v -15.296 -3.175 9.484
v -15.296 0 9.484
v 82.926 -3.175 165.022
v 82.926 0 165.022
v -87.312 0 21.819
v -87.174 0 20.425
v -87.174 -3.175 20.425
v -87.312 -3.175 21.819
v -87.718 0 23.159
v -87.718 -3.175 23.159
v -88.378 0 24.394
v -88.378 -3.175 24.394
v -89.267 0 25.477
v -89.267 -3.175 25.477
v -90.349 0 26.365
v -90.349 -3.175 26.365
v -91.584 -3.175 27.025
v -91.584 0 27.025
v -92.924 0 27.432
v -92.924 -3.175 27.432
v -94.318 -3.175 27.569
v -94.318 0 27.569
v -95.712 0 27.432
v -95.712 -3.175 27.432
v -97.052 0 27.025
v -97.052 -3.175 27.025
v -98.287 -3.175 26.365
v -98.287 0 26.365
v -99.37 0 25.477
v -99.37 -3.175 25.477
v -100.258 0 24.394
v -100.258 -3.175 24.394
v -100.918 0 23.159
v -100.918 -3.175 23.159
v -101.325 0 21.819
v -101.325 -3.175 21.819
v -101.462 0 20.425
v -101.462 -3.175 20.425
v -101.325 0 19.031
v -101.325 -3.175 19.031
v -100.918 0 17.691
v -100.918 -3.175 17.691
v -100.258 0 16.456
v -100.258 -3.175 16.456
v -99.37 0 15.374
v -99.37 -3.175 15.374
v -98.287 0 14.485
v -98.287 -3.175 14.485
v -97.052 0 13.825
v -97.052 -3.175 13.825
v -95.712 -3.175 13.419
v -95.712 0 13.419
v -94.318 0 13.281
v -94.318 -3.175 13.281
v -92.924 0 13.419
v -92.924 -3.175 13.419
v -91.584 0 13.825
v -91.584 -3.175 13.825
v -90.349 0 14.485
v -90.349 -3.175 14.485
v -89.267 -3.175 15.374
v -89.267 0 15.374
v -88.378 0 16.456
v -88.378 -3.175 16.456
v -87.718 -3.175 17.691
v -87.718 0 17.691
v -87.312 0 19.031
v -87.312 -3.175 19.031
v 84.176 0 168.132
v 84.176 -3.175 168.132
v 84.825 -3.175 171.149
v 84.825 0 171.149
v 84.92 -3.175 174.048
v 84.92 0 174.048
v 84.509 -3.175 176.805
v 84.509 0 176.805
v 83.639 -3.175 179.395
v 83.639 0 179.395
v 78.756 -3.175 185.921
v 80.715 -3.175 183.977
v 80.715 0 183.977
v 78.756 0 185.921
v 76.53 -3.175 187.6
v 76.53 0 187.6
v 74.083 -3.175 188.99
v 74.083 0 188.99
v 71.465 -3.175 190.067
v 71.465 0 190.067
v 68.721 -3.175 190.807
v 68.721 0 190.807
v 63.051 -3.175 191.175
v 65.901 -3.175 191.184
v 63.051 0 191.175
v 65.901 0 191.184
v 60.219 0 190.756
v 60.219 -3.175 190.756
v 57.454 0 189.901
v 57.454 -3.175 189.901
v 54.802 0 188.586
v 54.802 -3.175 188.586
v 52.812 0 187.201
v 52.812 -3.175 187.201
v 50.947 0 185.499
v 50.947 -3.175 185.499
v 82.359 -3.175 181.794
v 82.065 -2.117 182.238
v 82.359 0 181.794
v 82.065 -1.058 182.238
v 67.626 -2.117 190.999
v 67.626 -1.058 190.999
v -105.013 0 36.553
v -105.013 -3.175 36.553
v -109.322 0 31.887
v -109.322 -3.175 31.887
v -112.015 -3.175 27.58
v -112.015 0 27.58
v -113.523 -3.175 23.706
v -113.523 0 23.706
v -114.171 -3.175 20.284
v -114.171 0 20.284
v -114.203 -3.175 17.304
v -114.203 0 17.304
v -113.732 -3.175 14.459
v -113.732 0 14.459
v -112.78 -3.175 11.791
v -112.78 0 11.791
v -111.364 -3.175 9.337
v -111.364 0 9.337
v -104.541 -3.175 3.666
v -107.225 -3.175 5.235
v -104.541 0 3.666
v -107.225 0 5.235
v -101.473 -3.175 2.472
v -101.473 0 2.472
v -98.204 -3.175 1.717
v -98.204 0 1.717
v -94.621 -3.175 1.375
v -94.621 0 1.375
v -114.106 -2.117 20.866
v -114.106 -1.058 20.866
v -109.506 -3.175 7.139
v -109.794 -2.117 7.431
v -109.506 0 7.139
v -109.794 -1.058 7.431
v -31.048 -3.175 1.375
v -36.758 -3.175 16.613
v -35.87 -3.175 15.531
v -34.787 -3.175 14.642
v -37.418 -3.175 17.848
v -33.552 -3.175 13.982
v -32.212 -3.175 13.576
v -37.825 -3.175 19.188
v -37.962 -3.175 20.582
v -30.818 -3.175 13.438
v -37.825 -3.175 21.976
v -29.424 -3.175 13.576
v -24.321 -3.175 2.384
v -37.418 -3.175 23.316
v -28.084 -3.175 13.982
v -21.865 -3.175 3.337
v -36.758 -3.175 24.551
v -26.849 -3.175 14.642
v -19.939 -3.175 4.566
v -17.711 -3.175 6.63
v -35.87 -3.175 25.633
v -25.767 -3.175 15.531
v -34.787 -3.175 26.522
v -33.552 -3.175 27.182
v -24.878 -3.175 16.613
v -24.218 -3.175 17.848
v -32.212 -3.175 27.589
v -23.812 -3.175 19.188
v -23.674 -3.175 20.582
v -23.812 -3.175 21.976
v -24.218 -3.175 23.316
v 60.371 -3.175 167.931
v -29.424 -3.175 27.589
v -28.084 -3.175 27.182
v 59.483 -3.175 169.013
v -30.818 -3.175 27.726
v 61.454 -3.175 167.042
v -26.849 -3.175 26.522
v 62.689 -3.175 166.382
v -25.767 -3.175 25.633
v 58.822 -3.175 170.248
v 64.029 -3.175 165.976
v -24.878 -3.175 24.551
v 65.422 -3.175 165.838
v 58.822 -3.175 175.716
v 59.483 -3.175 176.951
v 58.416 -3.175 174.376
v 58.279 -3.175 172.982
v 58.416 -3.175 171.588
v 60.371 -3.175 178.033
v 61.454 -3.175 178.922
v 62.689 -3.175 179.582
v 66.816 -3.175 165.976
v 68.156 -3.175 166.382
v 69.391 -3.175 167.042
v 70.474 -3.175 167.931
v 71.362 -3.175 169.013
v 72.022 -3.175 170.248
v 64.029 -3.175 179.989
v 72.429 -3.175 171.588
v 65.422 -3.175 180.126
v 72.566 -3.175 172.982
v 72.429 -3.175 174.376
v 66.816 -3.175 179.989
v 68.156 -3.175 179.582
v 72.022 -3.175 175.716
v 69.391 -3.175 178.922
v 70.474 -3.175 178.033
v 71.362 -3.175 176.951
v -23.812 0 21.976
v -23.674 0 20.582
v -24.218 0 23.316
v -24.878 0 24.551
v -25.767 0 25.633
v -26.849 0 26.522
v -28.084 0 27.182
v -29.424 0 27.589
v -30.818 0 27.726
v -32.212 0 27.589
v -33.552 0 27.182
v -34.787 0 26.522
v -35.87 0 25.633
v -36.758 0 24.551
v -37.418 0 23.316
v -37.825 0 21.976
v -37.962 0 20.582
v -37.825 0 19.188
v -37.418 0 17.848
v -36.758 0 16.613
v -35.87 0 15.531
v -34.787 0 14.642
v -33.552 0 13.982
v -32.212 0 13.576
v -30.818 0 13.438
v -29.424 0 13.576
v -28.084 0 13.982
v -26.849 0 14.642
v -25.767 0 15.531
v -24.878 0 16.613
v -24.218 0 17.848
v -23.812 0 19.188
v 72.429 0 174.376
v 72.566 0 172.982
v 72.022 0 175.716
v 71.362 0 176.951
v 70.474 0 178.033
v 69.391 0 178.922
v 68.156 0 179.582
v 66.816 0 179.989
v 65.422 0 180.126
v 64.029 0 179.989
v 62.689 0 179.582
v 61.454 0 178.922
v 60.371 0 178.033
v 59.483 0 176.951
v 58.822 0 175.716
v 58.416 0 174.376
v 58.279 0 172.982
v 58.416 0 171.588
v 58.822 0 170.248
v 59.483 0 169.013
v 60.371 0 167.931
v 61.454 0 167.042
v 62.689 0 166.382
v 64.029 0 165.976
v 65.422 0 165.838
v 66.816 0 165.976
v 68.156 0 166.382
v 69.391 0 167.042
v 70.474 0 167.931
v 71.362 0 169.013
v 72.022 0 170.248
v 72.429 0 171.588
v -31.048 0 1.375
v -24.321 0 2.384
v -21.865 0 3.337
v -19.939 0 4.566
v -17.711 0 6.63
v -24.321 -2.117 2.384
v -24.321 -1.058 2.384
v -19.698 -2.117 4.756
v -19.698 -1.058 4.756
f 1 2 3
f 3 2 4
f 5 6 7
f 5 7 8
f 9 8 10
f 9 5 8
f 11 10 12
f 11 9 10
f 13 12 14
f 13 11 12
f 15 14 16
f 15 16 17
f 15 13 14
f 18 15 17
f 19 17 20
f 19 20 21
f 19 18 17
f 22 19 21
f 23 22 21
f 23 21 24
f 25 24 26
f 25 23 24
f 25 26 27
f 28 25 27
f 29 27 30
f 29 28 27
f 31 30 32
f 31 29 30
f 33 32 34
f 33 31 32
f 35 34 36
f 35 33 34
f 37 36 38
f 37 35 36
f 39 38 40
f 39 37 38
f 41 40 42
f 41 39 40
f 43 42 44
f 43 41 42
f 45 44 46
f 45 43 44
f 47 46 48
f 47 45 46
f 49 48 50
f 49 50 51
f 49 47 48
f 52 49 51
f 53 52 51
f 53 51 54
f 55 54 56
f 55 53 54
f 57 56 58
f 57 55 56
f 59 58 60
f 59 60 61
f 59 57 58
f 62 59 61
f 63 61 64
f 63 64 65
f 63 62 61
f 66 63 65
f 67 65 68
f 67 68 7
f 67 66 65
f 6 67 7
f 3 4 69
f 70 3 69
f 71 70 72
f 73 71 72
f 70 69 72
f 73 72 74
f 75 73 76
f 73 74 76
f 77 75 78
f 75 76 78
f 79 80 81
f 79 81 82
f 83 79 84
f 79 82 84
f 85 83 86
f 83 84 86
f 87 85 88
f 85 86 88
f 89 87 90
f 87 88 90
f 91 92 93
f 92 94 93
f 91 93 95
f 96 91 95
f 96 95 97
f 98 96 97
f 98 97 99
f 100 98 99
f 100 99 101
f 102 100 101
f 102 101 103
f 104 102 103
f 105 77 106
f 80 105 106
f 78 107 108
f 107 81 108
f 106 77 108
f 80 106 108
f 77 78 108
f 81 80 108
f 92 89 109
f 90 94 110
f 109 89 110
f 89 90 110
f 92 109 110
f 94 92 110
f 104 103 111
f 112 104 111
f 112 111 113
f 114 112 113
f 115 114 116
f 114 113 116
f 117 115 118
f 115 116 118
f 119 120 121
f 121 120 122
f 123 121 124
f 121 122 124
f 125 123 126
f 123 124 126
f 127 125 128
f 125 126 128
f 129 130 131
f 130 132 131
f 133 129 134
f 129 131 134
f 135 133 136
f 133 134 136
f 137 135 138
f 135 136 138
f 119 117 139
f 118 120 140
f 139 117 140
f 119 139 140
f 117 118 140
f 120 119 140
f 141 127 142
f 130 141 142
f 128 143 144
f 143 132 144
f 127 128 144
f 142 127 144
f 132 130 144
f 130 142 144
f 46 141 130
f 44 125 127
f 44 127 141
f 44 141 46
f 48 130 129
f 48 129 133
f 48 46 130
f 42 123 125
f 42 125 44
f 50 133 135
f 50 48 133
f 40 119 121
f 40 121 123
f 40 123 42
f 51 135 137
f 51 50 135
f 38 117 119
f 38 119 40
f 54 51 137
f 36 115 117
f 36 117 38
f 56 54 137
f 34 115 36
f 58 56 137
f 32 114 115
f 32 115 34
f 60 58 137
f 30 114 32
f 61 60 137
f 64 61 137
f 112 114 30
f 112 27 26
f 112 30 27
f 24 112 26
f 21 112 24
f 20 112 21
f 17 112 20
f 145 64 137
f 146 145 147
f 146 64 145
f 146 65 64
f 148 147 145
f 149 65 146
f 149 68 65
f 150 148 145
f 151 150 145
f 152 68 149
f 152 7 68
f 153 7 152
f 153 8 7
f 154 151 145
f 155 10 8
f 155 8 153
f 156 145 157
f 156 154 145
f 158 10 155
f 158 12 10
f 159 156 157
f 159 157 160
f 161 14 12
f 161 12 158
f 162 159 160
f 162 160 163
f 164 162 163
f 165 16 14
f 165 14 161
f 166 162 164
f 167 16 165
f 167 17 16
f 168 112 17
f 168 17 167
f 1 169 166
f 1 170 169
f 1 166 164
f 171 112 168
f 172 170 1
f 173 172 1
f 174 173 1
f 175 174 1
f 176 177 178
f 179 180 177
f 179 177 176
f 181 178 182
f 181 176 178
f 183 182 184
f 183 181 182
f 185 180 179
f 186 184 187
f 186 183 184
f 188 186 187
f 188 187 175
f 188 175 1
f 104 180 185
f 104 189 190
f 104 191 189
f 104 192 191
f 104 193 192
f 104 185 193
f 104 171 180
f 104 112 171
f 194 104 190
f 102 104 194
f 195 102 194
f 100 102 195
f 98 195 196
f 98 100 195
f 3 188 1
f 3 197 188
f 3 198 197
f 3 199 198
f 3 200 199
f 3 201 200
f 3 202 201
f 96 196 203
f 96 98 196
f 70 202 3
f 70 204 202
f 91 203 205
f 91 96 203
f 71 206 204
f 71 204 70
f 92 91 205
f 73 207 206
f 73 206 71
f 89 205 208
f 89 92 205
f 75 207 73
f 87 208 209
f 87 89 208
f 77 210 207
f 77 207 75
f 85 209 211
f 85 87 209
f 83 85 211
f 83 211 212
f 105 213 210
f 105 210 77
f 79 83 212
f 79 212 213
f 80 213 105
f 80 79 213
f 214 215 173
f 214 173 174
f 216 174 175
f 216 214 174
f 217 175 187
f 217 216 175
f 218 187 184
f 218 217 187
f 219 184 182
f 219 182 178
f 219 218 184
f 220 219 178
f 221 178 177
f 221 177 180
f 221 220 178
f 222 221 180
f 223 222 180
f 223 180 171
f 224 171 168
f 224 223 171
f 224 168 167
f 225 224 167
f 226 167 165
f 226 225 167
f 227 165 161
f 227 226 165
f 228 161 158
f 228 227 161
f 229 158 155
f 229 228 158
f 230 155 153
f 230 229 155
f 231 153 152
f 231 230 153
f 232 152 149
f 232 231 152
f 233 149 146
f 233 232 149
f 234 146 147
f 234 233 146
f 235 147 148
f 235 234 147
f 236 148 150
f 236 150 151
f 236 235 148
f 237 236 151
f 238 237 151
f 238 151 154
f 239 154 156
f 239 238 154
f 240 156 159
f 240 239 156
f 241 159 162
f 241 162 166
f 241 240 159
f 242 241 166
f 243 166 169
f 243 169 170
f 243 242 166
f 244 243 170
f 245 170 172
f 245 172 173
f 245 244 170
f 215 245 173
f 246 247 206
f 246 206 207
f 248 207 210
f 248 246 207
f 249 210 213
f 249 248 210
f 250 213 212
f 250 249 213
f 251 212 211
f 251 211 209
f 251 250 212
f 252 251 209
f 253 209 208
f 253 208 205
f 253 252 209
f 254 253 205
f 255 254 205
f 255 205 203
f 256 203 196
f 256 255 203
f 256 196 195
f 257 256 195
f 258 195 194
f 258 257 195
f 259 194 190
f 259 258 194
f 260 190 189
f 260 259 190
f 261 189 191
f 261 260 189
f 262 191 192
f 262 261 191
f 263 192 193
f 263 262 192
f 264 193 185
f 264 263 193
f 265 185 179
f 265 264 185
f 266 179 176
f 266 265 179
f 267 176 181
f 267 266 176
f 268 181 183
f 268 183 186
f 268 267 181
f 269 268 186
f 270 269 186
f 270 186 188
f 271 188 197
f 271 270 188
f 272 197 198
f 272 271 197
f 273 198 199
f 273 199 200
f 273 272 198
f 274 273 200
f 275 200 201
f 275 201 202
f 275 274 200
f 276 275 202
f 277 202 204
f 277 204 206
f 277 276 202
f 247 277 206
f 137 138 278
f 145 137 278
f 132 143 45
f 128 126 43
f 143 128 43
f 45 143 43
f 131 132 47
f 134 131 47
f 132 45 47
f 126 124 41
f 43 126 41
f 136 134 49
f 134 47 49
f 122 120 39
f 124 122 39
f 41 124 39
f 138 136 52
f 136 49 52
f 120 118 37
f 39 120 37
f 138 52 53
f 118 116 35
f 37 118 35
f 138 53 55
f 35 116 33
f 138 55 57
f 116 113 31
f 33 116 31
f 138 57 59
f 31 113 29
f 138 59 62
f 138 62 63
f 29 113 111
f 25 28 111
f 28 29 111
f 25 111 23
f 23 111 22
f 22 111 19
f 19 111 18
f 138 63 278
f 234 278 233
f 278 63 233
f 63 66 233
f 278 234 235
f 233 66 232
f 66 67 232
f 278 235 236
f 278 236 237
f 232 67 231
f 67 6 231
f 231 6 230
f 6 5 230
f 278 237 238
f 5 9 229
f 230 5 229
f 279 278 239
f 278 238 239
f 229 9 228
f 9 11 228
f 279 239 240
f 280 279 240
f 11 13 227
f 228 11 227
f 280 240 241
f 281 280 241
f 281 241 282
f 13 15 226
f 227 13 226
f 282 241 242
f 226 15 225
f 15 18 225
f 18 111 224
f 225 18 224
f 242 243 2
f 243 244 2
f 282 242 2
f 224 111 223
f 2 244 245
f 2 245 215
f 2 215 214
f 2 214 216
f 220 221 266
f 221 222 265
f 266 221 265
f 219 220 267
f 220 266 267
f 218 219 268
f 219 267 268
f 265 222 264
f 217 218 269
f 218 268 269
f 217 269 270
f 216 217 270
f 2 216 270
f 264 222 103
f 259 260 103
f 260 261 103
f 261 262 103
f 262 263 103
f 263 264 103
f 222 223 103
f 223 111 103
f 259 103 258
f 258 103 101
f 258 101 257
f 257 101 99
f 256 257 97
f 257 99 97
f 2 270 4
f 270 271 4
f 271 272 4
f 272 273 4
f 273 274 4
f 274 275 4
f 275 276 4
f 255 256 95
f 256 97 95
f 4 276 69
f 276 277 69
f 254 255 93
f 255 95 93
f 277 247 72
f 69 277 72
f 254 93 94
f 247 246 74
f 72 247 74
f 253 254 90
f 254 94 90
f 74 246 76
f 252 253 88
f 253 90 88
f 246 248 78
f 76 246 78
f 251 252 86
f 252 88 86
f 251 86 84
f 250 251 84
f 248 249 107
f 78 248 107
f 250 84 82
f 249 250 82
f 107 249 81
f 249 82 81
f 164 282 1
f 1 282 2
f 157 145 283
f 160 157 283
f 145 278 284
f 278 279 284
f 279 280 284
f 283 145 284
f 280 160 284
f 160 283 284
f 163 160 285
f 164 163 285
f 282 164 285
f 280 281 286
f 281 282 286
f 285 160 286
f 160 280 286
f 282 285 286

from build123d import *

# Parameters (mm, degrees)
F0_R     = 7.14375
F1_DEPTH = 3.175


with BuildPart() as f1:
    # F0 (on Front) → F1 (new body)
    with BuildSketch(Plane.XZ):
        with BuildLine():
            add(Edge.make_bspline(
                [(82.926092, 165.021802), (92.632547, 184.53142), (64.966619, 200.063169), (50.946968, 185.499491)],
                knots=[0, 0, 0, 0, 37.973677, 37.973677, 37.973677, 37.973677], degree=3))
            Line((50.946968, 185.499491), (-105.013265, 36.552987))
            add(Edge.make_bspline(
                [(-105.013265, 36.552987), (-121.657088, 21.448022), (-114.376582, 2.033332), (-94.6206, 1.375155)],
                knots=[0, 0, 0, 0, 36.680886, 36.680886, 36.680886, 36.680886], degree=3))
            Line((-94.6206, 1.375155), (-31.048113, 1.375155))
            add(Edge.make_bspline(
                [(-31.048113, 1.375155), (-22.642167, 2.033332), (-20.215331, 3.24675), (-15.296232, 9.48368)],
                knots=[0, 0, 0, 0, 17.716376, 17.716376, 17.716376, 17.716376], degree=3))
            Line((-15.296232, 9.48368), (82.926092, 165.021802))
        make_face()
        with Locations((-94.318171, 20.425155)):
            Circle(F0_R, mode=Mode.SUBTRACT)
        with Locations((-30.818171, 20.582018)):
            Circle(F0_R, mode=Mode.SUBTRACT)
        with Locations((65.422429, 172.982018)):
            Circle(F0_R, mode=Mode.SUBTRACT)
    extrude(amount=F1_DEPTH)


solid = f1.part
